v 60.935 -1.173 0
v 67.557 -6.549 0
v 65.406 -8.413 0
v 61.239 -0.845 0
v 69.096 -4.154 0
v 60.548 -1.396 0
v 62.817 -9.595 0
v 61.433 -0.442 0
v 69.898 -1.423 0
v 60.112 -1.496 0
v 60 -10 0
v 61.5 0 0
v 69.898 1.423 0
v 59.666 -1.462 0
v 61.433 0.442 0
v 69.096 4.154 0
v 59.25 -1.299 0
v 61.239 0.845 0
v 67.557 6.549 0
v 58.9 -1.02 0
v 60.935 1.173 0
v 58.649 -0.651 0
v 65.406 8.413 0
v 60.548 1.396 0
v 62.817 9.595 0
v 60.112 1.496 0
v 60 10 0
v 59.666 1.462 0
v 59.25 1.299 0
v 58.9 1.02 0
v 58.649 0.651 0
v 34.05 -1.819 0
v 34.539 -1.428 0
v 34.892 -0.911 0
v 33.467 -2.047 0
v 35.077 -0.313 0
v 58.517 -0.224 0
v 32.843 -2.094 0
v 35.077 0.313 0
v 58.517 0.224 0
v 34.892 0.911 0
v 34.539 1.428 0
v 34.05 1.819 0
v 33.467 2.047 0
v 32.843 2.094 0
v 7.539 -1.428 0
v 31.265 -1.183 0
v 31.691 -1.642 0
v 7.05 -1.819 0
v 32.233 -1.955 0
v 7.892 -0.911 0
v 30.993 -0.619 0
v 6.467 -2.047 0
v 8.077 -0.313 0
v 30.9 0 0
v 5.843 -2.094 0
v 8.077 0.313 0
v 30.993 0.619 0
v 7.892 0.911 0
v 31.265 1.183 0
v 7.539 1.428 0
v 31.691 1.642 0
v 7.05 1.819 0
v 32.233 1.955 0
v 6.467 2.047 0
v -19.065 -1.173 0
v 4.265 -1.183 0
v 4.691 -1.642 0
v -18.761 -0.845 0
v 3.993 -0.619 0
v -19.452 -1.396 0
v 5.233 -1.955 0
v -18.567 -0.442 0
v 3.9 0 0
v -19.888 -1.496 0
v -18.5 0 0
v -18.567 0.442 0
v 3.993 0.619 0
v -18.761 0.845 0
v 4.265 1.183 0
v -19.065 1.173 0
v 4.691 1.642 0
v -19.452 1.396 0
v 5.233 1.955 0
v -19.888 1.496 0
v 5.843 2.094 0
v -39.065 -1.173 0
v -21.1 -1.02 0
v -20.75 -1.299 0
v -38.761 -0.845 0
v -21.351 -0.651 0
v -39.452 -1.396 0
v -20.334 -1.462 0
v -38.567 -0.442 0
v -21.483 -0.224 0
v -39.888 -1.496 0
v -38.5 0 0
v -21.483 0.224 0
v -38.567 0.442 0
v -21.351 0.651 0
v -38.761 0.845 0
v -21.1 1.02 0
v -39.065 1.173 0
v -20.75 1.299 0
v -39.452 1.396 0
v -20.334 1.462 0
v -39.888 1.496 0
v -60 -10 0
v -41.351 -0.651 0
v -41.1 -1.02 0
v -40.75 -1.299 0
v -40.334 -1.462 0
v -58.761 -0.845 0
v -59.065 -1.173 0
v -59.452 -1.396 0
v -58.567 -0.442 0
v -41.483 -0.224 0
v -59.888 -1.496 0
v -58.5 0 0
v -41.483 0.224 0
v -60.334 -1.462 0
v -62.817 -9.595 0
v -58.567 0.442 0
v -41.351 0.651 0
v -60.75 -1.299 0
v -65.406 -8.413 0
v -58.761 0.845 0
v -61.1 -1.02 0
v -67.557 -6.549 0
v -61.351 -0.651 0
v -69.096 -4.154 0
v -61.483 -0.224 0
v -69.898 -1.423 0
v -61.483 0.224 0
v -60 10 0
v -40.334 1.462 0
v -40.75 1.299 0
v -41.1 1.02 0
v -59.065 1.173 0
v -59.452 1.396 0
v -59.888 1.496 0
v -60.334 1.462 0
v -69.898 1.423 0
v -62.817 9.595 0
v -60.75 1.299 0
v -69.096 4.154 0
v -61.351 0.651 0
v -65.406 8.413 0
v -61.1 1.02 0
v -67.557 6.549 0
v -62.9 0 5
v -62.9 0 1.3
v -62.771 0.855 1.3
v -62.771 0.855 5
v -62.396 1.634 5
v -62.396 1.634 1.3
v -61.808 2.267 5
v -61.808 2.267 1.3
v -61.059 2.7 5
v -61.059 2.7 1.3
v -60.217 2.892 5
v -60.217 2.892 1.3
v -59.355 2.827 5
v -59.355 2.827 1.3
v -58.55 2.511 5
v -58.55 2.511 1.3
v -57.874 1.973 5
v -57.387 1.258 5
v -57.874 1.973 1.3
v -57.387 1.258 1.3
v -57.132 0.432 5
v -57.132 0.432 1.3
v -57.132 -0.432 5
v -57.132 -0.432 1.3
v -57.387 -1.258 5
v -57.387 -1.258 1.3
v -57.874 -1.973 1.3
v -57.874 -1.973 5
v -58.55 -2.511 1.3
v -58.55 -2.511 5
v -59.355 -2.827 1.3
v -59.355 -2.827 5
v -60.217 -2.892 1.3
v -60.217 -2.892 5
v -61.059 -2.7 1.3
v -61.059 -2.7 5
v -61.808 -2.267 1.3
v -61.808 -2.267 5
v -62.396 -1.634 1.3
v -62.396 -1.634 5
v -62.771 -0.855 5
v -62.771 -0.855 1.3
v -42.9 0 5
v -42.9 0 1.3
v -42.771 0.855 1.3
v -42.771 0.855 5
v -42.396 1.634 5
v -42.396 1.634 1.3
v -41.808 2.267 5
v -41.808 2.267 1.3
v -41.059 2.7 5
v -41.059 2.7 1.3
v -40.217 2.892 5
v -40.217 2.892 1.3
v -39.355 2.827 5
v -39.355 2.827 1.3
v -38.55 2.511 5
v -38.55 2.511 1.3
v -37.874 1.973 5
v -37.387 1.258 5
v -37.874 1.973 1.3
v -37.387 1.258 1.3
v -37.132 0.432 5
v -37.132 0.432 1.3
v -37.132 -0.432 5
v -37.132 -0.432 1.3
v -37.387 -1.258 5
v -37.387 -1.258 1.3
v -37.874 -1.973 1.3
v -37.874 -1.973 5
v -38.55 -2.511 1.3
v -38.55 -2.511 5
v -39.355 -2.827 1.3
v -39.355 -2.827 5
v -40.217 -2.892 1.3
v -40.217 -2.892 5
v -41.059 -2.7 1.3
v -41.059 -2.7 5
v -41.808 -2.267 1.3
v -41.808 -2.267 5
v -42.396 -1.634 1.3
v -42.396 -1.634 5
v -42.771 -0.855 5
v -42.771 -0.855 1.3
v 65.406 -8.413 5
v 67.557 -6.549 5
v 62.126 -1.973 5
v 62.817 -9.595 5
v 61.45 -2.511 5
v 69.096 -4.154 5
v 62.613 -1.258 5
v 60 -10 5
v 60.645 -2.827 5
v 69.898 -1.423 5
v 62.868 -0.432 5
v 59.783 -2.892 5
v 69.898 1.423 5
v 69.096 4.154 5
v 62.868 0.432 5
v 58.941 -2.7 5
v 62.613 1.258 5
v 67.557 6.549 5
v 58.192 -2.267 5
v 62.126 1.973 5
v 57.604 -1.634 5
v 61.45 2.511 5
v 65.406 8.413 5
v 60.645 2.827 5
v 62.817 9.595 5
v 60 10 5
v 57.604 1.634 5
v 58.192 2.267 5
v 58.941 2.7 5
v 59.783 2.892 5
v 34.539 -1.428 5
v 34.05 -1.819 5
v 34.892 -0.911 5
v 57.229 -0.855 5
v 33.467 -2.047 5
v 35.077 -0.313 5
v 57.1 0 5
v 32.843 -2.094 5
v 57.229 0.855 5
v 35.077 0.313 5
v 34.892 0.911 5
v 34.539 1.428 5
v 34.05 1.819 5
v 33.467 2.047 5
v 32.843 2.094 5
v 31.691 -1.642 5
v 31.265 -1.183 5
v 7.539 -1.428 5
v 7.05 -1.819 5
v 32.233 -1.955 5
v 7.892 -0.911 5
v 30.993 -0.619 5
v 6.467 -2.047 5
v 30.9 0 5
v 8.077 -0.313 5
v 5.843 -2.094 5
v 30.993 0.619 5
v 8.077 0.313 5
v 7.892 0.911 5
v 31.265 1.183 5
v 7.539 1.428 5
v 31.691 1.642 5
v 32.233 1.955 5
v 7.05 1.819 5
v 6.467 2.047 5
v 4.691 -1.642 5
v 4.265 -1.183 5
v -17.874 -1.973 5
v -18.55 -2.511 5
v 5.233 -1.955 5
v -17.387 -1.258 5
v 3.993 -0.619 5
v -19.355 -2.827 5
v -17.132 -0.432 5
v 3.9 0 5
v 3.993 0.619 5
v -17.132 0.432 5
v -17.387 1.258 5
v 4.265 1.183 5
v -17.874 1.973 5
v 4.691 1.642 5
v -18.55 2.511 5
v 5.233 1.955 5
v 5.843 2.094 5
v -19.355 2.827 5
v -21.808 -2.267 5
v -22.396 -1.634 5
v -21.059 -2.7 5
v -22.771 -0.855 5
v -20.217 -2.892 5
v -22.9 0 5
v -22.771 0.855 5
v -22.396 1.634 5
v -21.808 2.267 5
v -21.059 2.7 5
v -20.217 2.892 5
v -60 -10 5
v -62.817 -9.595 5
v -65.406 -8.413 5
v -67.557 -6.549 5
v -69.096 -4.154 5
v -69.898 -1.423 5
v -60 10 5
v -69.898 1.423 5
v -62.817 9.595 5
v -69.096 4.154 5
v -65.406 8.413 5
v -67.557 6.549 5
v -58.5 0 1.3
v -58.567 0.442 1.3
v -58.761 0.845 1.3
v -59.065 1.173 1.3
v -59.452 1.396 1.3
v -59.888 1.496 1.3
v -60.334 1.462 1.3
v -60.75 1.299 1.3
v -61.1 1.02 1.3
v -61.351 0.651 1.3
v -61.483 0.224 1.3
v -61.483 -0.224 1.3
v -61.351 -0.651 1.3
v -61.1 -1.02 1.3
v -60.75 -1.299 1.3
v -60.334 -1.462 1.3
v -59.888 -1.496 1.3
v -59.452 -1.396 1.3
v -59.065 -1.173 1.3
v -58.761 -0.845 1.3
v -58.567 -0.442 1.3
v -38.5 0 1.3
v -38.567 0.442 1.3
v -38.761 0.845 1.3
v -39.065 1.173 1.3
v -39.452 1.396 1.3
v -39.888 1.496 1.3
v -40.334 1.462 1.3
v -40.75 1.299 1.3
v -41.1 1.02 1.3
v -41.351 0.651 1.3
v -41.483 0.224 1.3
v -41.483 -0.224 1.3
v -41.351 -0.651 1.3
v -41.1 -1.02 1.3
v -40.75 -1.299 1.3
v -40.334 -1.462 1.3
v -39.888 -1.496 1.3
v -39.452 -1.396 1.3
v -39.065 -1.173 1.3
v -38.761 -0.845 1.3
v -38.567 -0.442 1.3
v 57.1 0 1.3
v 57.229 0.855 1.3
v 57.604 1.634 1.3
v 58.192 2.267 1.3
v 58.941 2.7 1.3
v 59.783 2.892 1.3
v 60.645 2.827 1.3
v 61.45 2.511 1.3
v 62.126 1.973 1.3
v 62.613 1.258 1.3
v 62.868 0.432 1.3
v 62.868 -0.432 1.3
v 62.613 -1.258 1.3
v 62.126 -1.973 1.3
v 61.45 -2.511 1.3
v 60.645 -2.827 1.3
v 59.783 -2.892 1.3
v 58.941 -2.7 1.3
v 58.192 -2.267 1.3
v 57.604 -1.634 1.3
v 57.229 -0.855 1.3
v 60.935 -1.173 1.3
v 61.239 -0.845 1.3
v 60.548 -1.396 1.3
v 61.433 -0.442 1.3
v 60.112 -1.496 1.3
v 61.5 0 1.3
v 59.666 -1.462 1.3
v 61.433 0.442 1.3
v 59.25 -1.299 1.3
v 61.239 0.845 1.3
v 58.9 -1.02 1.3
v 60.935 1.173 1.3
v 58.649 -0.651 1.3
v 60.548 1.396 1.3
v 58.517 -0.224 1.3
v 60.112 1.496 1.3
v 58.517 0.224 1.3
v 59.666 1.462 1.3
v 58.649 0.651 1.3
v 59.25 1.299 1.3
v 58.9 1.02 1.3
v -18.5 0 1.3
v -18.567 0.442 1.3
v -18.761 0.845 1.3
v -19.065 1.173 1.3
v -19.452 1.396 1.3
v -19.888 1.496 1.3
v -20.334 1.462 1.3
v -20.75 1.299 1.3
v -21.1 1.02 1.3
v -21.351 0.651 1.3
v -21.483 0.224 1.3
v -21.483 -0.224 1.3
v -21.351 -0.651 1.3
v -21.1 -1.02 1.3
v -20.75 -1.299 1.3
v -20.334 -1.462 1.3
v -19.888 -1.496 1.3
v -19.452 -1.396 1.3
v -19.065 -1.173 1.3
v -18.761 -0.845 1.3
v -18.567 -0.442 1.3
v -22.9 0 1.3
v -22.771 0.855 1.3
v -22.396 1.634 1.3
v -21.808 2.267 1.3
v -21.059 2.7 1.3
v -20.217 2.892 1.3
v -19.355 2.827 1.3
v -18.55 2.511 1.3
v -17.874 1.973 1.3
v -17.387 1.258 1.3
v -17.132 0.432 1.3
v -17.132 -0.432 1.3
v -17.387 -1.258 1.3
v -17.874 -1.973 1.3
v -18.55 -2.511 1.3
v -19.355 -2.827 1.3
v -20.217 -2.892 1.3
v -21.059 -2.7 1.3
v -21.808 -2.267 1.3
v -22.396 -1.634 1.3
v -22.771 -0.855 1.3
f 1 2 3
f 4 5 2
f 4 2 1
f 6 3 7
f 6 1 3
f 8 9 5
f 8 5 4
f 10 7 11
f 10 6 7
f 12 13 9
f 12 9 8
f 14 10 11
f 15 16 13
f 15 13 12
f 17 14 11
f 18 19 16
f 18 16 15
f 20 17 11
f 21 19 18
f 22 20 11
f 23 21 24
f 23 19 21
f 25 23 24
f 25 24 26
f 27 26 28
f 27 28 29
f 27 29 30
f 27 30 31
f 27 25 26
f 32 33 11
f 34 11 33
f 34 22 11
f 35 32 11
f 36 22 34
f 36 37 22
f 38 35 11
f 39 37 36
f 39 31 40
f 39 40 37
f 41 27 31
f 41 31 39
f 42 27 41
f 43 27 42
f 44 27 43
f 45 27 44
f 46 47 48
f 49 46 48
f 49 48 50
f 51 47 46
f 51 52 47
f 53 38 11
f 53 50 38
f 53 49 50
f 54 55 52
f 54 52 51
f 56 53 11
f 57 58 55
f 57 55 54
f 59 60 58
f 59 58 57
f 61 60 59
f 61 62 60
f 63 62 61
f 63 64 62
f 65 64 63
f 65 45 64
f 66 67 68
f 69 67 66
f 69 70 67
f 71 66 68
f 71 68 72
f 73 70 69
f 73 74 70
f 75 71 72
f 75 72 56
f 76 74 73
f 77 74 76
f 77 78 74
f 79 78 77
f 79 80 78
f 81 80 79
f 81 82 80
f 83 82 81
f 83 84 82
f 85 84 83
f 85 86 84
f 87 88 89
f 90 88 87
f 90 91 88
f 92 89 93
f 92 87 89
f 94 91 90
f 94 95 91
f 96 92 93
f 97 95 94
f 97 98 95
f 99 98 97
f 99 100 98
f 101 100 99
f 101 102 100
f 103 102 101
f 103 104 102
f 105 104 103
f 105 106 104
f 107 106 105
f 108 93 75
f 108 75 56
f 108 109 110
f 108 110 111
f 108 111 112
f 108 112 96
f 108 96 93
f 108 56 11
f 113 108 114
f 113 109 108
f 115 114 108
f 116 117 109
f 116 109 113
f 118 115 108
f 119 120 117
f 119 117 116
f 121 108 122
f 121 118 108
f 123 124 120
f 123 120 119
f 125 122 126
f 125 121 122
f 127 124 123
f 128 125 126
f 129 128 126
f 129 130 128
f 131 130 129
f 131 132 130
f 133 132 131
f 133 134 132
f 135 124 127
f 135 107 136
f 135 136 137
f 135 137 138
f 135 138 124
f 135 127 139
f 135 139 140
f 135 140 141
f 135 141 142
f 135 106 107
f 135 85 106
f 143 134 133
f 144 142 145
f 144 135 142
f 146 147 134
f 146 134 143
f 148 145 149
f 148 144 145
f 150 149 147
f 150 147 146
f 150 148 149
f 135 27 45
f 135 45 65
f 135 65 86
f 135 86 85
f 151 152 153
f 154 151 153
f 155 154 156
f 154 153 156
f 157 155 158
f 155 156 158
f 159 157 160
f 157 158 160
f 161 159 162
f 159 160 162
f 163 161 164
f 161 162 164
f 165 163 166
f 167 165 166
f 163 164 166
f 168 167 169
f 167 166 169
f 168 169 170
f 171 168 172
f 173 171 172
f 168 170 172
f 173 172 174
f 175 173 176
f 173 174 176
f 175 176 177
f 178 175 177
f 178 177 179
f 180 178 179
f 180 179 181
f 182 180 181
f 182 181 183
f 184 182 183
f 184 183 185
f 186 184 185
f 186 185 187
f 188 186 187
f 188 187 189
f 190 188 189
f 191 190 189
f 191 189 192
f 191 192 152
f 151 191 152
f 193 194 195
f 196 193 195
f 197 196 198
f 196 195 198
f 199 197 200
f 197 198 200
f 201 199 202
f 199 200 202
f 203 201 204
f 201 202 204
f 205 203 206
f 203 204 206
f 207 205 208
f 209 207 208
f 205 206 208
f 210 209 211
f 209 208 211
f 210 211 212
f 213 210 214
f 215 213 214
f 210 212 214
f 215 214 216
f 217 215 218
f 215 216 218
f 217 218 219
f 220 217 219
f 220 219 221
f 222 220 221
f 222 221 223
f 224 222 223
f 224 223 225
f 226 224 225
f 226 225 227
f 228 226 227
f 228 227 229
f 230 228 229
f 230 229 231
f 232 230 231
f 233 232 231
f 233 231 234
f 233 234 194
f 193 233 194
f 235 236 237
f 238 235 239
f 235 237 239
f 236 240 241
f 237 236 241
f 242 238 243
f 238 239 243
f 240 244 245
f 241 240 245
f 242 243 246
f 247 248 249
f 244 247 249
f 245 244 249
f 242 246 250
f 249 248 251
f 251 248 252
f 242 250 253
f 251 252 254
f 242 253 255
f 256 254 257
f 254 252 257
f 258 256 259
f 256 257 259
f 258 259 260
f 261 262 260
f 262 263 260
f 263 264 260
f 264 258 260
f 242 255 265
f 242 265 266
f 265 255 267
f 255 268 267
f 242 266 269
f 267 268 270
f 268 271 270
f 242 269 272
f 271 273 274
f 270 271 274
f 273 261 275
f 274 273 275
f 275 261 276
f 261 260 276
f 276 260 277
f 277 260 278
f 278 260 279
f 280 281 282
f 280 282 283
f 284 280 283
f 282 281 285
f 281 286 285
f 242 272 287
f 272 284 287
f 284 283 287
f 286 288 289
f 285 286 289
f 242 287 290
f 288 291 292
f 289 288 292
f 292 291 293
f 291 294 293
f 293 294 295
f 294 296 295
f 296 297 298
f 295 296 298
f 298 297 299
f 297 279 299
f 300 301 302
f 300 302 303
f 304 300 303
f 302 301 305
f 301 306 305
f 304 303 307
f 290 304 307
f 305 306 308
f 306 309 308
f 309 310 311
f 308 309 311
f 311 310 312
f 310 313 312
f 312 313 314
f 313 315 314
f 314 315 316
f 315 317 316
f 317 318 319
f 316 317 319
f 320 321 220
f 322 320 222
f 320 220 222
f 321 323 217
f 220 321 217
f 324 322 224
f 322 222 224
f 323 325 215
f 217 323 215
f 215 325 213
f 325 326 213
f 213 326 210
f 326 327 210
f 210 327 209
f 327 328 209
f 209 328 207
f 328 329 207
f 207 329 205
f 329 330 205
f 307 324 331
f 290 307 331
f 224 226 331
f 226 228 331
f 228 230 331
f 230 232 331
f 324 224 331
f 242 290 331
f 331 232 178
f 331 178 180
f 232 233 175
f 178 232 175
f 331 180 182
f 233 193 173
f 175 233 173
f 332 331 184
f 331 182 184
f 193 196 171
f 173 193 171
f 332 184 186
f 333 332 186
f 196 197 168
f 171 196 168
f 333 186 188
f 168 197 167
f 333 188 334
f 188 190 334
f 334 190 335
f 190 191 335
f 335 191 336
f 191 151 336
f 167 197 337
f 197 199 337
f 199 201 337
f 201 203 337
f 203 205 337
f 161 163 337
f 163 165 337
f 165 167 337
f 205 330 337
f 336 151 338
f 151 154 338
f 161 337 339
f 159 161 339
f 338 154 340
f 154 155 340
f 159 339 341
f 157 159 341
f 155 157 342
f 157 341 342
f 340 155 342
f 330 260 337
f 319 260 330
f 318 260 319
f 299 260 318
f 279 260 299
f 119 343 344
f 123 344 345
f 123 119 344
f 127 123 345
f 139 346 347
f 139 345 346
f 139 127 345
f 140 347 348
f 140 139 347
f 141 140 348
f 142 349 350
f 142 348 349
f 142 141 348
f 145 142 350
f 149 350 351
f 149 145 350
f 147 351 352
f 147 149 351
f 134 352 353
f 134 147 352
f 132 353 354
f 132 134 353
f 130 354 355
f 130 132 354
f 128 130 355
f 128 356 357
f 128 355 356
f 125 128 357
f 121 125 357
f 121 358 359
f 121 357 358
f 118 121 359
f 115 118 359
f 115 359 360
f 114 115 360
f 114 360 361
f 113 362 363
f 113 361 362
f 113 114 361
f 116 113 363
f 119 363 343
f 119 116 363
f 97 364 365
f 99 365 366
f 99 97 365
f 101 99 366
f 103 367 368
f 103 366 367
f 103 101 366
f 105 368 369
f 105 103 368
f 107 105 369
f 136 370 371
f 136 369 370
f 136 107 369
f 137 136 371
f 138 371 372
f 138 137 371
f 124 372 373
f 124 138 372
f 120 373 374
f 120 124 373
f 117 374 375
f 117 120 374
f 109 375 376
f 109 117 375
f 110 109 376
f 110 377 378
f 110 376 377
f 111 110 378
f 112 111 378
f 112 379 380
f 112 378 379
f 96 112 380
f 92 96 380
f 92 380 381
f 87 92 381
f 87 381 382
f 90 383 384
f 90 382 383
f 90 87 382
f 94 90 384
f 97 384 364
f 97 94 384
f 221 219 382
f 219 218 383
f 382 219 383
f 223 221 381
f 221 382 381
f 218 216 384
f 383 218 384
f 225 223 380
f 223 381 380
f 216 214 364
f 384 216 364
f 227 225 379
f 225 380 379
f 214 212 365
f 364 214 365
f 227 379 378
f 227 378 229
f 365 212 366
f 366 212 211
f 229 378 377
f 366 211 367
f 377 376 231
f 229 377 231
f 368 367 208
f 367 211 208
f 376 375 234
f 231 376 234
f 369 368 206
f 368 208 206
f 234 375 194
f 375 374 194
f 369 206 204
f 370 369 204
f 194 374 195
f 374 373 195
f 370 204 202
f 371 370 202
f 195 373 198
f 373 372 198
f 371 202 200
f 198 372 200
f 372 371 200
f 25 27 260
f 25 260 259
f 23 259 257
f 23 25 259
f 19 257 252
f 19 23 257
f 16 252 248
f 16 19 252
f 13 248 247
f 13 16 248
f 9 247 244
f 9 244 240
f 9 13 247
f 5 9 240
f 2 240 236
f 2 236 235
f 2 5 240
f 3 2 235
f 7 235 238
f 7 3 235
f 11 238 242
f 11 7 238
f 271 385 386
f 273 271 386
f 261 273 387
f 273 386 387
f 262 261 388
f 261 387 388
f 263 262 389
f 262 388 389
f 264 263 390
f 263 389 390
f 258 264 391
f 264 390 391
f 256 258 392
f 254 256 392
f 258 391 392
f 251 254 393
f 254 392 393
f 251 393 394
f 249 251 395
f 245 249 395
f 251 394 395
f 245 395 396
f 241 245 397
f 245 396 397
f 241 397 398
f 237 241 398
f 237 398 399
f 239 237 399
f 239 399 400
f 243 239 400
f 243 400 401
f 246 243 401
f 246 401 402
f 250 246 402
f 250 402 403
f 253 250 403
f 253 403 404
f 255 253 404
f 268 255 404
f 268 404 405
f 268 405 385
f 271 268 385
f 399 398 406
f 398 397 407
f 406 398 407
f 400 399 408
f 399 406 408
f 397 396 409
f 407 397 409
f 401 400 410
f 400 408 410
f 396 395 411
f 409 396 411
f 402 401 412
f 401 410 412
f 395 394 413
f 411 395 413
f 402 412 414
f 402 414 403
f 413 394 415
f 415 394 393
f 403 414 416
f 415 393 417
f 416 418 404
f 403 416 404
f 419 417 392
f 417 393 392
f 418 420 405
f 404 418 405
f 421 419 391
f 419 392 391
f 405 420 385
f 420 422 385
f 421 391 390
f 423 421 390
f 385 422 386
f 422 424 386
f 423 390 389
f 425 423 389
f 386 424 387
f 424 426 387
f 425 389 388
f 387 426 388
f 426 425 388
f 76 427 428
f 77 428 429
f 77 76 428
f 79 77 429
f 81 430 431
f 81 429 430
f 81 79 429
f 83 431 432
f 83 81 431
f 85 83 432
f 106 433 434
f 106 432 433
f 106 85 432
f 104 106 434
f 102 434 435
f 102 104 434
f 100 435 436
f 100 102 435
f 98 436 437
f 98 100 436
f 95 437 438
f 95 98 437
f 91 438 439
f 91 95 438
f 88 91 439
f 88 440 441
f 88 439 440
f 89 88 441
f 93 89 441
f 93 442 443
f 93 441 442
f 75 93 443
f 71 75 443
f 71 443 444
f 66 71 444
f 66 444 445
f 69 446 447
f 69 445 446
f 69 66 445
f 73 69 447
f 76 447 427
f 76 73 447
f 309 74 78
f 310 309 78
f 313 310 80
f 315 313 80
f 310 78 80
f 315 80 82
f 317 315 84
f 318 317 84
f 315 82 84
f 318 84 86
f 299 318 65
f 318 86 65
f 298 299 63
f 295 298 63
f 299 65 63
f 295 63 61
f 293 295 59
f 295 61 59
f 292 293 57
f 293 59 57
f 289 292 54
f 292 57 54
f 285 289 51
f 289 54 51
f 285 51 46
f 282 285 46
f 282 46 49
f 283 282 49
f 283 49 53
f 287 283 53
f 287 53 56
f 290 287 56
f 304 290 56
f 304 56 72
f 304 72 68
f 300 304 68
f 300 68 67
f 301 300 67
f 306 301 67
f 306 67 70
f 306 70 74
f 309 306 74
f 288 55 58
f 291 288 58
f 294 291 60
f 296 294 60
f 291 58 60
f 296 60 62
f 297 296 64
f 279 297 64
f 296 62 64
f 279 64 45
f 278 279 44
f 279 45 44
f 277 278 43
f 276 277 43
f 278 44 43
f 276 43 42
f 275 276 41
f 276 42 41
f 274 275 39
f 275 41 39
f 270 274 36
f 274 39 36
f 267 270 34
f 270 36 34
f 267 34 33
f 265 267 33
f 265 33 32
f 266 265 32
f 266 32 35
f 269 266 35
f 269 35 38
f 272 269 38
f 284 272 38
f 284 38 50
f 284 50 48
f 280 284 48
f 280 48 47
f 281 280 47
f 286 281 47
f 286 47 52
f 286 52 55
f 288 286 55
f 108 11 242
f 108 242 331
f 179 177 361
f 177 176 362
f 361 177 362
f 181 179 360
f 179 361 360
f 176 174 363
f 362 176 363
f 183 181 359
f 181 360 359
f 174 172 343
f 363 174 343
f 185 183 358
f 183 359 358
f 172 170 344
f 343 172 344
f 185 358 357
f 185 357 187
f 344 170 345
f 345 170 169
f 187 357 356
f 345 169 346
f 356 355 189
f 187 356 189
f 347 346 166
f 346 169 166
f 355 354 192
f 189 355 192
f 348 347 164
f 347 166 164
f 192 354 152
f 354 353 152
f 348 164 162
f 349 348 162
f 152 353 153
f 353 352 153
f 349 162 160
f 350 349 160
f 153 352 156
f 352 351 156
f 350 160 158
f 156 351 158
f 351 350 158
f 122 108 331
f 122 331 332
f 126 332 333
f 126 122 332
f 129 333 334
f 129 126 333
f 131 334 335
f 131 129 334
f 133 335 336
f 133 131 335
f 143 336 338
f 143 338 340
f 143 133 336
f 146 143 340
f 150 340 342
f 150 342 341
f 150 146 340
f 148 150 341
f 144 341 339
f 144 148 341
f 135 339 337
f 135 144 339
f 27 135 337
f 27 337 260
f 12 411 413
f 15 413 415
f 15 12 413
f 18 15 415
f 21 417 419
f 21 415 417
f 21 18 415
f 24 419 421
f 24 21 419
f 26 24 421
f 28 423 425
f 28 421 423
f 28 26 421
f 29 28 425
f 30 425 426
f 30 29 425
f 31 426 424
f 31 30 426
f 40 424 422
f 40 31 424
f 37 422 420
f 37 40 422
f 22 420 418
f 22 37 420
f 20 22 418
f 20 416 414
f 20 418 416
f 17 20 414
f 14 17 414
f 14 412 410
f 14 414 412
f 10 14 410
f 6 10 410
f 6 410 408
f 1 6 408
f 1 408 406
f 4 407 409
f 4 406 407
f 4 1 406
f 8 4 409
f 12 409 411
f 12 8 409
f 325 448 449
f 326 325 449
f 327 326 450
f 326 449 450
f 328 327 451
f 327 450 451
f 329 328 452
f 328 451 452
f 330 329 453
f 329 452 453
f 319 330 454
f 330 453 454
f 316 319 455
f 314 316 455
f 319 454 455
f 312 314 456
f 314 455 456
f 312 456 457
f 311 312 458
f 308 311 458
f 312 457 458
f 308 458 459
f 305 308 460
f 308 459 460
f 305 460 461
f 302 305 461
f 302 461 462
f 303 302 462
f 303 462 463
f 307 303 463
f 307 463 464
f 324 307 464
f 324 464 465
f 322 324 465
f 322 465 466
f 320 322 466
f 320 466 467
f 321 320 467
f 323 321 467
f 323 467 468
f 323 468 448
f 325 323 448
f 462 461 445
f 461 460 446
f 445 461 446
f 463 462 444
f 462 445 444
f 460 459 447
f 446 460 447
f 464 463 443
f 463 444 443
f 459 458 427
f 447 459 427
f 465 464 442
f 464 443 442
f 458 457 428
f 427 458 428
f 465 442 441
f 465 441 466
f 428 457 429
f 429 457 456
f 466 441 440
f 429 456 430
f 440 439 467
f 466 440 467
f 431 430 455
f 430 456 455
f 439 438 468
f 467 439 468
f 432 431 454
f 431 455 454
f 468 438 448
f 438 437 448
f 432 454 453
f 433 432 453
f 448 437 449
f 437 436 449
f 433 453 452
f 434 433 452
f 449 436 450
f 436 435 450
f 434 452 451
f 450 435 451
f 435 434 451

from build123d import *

# Parameters (mm, degrees)
ESQUISSE1_R             = 1.5
EXTRUSION1_DEPTH        = 5
ESQUISSE2_R             = 2.9
ENL_V_MAT_EXTRU_1_DEPTH = 71.807414866
ESQUISSE3_R             = 2.1
ENL_V_MAT_EXTRU_2_DEPTH = 71.887234394


with BuildPart() as part:
    # Esquisse1 → Extrusion1 (new body)
    with BuildSketch(Plane.XY):
        with BuildLine():
            Line((-60, 10), (60, 10))
            ThreePointArc((60, 10), (70, 0), (60, -10))
            Line((60, -10), (-60, -10))
            ThreePointArc((-60, -10), (-70, 0), (-60, 10))
        make_face()
        with Locations((-40, 0)):
            Circle(ESQUISSE1_R, mode=Mode.SUBTRACT)
        with Locations((-20, 0)):
            Circle(ESQUISSE1_R, mode=Mode.SUBTRACT)
        with Locations((-60, 0)):
            Circle(ESQUISSE1_R, mode=Mode.SUBTRACT)
        with Locations((60, 0)):
            Circle(ESQUISSE1_R, mode=Mode.SUBTRACT)
    extrude(amount=EXTRUSION1_DEPTH)

    # Esquisse2 → Enlèv. mat.-Extru.1 (cut, through all)
    with BuildSketch(Plane(origin=(0, 0, 1.3), x_dir=(-1, 0, 0), z_dir=(0, 0, -1))):
        with Locations((-60, 0)):
            Circle(ESQUISSE2_R)
        with Locations((60, 0)):
            Circle(ESQUISSE2_R)
        with Locations((20, 0)):
            Circle(ESQUISSE2_R)
        with Locations((40, 0)):
            Circle(ESQUISSE2_R)
    extrude(amount=-ENL_V_MAT_EXTRU_1_DEPTH, mode=Mode.SUBTRACT)

    # Esquisse3 → Enlèv. mat.-Extru.2 (cut, through all)
    with BuildSketch(Plane(origin=(0, 0, 0), x_dir=(-1, 0, 0), z_dir=(0, 0, -1))):
        with Locations((-6, 0)):
            Circle(ESQUISSE3_R)
        with Locations((-33, 0)):
            Circle(ESQUISSE3_R)
    extrude(amount=-ENL_V_MAT_EXTRU_2_DEPTH, mode=Mode.SUBTRACT)


solid = part.part
